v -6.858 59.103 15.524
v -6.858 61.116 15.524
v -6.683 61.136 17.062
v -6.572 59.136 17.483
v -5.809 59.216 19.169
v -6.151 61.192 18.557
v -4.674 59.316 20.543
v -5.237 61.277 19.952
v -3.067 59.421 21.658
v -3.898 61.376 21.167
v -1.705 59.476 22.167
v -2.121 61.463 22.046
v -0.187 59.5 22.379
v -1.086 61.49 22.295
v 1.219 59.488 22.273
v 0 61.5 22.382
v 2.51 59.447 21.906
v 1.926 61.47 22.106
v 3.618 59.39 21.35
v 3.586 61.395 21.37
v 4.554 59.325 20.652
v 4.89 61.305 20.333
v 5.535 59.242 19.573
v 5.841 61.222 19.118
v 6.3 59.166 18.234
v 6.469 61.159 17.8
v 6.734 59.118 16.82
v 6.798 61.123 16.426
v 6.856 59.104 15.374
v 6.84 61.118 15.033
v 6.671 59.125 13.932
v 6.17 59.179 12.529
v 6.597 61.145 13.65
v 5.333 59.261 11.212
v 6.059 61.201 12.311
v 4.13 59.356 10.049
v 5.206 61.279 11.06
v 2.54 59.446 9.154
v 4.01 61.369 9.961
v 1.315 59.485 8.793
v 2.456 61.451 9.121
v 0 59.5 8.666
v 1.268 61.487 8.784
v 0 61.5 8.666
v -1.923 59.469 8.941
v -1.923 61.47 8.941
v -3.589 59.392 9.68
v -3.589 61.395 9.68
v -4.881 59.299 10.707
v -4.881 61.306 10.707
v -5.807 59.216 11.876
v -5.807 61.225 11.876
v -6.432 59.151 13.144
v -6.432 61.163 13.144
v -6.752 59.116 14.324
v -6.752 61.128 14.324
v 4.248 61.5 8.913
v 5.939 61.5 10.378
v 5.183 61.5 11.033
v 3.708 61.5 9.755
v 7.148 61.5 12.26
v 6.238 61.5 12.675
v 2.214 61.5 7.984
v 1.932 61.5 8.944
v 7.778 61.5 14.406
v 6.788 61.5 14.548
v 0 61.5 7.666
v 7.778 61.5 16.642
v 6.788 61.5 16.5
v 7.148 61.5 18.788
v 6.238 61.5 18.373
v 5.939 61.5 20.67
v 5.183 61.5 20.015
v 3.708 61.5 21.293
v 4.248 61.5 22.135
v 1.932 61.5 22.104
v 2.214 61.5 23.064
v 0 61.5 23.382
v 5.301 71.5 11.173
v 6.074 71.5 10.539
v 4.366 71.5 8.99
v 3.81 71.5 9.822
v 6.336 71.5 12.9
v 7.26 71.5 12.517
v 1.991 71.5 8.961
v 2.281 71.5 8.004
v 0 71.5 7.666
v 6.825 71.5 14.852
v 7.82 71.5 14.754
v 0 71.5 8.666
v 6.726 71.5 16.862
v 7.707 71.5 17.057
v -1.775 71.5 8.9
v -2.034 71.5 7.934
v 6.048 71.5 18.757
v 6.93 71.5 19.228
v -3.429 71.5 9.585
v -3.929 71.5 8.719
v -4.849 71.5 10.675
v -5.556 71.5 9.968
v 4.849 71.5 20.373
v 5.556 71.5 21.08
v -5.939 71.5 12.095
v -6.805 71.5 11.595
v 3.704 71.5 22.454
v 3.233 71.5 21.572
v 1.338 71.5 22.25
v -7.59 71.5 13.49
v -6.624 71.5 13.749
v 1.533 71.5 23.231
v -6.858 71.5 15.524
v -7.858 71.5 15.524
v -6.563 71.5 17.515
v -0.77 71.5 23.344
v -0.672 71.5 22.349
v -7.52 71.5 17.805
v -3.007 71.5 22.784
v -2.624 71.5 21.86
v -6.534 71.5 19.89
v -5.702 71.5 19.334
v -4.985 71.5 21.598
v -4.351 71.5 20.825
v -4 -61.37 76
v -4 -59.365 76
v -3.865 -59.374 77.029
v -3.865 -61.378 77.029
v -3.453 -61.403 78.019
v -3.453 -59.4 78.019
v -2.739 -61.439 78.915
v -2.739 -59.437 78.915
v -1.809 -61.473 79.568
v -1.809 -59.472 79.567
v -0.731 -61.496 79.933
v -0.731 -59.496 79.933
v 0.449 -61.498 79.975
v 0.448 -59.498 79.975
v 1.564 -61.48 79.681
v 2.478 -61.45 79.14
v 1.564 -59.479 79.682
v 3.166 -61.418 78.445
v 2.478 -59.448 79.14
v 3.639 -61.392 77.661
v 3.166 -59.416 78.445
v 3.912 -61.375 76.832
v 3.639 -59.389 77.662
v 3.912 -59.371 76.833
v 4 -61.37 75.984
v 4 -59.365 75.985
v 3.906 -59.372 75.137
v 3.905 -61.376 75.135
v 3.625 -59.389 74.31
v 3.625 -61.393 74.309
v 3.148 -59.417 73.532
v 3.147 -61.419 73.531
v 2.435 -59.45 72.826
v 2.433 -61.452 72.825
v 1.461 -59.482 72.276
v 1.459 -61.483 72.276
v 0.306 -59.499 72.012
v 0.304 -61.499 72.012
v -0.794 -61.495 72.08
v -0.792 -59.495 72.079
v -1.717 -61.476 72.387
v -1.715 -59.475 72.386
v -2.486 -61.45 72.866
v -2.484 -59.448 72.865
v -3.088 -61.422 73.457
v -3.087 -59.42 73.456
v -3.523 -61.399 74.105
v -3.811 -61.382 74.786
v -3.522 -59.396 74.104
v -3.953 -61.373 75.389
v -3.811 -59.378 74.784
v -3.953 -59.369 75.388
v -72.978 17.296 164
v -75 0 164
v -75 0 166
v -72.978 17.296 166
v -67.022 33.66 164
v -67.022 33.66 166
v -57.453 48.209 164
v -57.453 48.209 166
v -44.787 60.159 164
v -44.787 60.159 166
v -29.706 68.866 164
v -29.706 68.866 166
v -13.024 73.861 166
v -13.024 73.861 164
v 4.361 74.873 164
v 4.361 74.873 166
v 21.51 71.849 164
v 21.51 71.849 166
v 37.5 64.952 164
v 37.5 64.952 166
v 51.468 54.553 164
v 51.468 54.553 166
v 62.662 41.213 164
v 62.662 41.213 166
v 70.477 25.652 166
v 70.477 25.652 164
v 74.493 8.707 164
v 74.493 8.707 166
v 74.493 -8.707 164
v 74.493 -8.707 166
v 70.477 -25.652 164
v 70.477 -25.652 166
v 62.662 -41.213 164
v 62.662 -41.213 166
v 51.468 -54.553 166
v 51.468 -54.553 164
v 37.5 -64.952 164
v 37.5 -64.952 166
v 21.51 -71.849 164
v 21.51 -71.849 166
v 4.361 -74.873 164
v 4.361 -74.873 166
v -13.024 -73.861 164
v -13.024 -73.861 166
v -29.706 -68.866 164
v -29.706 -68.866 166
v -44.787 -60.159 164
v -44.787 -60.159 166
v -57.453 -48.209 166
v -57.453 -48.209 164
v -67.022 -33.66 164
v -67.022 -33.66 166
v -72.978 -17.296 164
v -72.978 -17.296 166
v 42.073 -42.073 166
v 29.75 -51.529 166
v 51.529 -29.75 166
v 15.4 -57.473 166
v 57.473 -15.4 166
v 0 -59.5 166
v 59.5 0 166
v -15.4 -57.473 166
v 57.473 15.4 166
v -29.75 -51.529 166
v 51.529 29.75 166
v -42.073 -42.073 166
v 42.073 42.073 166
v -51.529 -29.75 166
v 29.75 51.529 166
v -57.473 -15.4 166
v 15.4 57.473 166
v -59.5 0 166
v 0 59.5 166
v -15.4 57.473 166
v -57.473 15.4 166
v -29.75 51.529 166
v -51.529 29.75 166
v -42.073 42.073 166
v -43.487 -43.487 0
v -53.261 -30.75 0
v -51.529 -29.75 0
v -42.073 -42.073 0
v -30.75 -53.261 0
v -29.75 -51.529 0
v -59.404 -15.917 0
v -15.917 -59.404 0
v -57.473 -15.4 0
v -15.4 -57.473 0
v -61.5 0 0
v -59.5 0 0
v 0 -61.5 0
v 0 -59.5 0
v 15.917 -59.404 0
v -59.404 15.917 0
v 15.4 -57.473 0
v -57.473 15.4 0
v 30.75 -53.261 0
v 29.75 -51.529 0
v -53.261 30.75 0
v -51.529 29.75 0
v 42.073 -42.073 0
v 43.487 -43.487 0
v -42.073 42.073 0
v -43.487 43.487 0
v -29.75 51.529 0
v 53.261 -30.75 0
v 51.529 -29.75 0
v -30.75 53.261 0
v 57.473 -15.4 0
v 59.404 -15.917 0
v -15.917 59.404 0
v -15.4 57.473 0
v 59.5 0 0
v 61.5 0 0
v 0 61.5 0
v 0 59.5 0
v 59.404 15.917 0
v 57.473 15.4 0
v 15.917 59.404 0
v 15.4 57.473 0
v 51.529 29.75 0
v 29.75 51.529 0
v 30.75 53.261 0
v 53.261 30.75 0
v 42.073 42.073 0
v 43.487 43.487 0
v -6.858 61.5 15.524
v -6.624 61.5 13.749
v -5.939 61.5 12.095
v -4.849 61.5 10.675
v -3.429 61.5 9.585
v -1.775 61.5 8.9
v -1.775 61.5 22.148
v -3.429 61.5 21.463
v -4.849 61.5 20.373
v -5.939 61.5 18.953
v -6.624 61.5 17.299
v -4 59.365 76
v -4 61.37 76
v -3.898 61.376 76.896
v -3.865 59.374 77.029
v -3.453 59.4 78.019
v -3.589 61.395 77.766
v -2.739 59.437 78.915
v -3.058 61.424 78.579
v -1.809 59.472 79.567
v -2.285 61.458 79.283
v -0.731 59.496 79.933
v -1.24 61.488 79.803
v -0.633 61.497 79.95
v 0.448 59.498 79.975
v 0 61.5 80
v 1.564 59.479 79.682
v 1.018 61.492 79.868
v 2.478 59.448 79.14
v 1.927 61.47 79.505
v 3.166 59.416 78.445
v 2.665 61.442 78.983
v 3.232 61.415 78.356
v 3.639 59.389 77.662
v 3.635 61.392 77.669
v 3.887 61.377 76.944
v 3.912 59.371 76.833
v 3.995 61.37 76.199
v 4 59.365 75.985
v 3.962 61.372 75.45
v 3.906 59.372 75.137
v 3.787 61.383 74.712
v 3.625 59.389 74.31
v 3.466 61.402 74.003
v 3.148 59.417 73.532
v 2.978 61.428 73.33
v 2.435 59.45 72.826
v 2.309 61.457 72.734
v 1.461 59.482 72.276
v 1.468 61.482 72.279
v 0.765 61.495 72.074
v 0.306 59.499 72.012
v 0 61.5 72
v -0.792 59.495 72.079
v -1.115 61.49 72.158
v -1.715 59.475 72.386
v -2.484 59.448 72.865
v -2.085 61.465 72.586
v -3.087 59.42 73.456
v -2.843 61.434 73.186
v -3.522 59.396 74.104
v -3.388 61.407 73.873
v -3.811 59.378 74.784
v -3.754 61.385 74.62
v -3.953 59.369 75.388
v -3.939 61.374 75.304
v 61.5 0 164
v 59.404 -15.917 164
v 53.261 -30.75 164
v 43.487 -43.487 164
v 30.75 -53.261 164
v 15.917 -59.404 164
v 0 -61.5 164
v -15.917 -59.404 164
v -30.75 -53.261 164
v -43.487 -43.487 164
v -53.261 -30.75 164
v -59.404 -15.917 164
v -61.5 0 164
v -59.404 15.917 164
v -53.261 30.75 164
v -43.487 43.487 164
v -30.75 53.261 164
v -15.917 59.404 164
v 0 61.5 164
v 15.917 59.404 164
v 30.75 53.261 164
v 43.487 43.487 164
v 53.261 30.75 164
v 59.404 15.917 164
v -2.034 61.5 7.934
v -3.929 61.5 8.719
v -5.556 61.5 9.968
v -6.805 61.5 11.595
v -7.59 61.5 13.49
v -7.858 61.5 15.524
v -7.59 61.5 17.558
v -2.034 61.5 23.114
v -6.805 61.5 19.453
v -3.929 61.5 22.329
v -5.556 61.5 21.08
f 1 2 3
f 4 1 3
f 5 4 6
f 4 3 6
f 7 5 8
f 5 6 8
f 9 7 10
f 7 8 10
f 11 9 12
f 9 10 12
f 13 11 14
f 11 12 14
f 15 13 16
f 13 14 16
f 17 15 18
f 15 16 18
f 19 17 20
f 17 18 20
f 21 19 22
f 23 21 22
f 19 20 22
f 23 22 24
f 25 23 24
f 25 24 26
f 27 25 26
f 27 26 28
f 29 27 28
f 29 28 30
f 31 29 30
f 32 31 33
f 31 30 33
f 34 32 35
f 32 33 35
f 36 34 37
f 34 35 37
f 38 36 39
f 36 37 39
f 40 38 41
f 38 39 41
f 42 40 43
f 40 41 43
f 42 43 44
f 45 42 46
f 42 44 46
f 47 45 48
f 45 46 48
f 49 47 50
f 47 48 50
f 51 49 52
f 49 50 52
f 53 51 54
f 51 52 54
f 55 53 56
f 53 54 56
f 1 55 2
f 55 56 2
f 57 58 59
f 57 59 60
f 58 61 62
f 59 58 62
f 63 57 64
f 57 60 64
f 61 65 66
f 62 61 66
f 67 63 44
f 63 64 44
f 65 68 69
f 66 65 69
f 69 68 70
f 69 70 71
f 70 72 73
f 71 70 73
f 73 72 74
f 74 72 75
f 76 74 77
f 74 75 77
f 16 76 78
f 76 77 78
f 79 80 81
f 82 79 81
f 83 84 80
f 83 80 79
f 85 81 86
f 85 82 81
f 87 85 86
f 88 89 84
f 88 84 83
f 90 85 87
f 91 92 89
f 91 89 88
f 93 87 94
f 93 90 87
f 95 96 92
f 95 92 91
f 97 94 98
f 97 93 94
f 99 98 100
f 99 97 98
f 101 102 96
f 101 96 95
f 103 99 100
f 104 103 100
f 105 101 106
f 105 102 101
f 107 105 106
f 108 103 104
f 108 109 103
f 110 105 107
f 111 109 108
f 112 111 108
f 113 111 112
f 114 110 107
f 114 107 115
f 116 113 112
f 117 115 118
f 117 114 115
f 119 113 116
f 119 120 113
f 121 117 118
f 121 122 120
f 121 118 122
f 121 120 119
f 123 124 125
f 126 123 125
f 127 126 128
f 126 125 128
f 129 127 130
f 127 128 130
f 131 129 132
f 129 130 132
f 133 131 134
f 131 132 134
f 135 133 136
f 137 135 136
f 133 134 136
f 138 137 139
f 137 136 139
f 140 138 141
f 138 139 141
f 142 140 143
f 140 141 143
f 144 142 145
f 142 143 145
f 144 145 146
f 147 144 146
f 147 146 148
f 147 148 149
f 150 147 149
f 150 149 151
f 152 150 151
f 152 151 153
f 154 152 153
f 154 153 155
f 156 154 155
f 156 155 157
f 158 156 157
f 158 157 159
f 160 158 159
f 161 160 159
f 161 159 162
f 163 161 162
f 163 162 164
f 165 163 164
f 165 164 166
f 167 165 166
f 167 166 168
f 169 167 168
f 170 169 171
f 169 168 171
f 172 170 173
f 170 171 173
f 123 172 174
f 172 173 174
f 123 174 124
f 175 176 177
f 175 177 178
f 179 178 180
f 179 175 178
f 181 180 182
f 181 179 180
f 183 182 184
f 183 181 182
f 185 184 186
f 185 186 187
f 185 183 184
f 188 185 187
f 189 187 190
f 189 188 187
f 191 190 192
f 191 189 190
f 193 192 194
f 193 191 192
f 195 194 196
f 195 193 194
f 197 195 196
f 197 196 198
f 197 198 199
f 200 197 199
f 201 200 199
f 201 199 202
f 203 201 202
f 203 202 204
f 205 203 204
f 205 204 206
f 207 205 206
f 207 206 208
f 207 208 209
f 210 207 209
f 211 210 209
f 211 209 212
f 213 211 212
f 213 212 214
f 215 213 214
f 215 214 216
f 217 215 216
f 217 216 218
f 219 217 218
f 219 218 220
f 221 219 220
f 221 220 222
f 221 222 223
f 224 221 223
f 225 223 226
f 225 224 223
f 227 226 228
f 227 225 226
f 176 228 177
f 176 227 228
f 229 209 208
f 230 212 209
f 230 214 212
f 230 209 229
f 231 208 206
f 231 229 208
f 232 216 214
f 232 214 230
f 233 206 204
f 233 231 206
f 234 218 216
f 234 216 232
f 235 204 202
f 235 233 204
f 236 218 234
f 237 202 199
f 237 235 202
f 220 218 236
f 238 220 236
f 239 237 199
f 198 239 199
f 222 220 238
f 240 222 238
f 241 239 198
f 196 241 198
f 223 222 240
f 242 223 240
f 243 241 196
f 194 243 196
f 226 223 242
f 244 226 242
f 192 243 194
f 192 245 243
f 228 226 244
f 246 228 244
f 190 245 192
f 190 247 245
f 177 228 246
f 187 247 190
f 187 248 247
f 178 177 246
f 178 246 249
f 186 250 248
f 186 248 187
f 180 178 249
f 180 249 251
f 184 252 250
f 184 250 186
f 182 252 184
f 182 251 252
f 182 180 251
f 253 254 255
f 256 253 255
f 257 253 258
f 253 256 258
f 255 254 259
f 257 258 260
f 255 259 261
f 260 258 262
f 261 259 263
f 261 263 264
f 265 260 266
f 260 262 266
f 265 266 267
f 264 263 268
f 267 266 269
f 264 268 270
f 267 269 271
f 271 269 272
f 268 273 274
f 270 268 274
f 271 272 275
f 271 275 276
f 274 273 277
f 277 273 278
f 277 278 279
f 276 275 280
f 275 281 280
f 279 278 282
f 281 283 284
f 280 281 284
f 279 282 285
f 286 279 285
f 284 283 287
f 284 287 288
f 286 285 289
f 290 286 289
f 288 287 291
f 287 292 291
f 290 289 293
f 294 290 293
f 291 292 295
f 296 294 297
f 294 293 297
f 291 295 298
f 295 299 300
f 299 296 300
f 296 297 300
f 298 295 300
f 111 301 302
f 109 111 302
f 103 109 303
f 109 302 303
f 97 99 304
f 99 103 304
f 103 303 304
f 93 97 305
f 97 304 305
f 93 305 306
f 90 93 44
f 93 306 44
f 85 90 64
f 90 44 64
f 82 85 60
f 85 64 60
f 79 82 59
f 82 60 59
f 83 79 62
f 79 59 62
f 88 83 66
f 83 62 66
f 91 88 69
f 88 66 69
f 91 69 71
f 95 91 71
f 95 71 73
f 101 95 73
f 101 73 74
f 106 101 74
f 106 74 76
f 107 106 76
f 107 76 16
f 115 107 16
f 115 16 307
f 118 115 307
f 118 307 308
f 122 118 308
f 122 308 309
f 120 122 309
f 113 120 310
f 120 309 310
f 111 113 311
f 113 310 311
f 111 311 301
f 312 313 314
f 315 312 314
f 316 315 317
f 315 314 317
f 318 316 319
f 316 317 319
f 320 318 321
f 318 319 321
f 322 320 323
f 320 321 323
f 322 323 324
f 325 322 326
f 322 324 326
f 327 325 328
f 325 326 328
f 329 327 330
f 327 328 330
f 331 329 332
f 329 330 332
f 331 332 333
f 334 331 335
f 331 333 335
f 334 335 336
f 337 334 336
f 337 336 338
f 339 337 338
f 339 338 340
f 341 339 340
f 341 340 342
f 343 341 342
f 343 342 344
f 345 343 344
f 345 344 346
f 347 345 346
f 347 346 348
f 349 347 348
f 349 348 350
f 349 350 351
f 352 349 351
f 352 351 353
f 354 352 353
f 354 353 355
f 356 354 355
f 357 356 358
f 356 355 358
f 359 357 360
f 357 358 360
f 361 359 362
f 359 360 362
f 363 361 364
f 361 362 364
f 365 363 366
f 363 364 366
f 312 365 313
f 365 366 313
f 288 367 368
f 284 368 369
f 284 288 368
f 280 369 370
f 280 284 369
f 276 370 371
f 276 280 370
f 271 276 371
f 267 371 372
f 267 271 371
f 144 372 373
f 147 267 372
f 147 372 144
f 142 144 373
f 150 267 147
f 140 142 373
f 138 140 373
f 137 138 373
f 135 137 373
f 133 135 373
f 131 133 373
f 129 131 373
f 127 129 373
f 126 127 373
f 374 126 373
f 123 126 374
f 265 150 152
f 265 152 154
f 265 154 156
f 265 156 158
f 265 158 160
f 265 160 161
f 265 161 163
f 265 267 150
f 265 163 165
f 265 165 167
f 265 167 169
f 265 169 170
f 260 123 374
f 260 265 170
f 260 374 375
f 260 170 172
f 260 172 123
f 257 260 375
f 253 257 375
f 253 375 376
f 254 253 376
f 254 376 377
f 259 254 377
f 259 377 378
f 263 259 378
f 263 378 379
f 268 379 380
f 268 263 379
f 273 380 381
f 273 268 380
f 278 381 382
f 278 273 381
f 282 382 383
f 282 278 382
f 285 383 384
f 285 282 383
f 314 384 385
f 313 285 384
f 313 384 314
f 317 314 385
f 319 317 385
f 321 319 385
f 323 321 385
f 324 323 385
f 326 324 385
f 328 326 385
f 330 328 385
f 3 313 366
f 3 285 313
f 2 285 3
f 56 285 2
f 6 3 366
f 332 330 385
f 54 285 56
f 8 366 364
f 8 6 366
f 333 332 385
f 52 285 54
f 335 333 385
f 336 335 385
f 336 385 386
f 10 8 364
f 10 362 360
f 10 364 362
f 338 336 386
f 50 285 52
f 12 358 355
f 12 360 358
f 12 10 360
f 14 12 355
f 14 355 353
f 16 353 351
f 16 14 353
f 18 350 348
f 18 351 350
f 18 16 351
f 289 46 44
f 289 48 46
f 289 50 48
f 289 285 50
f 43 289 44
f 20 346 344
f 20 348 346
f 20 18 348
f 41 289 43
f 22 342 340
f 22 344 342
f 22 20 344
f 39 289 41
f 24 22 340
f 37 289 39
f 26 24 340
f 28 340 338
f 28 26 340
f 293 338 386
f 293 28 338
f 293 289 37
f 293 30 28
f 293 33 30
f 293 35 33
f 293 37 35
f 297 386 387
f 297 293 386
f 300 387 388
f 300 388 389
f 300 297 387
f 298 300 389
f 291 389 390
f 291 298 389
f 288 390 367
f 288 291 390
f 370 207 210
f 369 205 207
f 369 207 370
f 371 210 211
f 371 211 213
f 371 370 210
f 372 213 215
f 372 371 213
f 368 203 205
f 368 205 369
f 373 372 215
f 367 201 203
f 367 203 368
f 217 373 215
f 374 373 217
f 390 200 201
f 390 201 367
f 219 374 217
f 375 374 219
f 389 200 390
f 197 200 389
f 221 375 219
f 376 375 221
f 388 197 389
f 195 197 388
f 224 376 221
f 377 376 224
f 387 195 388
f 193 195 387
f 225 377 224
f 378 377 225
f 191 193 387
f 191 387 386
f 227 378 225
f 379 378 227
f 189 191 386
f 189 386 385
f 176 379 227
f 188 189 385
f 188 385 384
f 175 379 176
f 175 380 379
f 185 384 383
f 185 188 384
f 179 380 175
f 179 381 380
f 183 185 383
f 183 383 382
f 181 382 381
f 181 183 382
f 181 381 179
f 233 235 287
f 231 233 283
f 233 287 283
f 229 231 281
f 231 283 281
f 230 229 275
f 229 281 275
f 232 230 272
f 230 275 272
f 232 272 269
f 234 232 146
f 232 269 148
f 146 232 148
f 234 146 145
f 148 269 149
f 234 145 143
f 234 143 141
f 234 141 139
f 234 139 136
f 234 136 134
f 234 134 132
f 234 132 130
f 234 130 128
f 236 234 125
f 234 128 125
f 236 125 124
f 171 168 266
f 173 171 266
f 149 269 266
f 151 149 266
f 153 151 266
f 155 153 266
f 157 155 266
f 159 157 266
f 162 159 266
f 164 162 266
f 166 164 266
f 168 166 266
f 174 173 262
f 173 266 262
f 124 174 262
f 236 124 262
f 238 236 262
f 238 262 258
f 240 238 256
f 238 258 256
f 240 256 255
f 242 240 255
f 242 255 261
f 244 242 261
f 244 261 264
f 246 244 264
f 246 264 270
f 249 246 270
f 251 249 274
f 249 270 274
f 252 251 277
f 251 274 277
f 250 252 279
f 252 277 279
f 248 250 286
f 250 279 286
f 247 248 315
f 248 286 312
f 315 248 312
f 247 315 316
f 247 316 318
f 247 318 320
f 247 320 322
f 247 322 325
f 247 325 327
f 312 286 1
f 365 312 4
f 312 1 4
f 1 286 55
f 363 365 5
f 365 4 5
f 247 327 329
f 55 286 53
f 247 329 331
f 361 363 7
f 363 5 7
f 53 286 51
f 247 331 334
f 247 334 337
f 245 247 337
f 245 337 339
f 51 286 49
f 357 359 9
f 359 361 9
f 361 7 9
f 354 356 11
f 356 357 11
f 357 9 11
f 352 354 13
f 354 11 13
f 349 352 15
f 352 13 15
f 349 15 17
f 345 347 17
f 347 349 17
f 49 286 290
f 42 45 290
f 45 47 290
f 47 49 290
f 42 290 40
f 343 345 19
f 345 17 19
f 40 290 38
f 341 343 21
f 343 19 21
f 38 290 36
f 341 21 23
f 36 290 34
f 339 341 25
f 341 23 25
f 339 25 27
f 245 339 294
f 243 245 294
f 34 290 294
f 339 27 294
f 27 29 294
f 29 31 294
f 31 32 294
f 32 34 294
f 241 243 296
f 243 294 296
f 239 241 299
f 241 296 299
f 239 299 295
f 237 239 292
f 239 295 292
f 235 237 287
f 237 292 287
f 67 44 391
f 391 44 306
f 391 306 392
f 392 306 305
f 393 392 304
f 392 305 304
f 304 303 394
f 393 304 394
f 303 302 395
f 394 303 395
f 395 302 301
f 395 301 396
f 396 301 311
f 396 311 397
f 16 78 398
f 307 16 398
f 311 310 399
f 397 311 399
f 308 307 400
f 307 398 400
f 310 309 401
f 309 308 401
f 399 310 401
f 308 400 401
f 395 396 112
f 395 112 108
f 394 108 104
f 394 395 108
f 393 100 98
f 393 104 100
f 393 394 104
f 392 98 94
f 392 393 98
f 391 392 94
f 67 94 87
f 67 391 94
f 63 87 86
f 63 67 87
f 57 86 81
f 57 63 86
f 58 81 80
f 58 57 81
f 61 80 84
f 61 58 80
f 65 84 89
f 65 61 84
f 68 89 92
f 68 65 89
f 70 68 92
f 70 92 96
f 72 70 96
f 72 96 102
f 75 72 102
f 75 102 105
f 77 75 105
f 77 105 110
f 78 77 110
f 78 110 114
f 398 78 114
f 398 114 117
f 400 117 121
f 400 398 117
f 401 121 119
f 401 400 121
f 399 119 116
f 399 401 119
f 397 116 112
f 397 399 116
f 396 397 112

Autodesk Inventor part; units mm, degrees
ref_plane "YZ Plane" through (0, 0, 0) normal (1, 0, 0) x (0, 1, 0)
ref_plane "XY Plane" through (0, 0, 0) normal (0, 0, 1) x (1, 0, 0)
sketch "Sketch1" plane through (0, 0, 0) normal (0, 0, 1) x (1, 0, 0)
  circle A0 centre (0, 0) radius 59.5
  circle A1 centre (0, 0) radius 61.5
  dimension "d0" = 119
  dimension "d1" = 123
extrude "Extrusion1" add sketch "Sketch1" along normal blind 331
ref_plane "Work Plane1" through (0, 61.5, 0) normal (0, 1, 0) x (-1, 0, 0)
sketch "Sketch2" plane through (0, 61.5, 0) normal (0, 1, 0) x (-1, 0, 0)
  line L0 (61.5, 0) -> (-61.5, 0) projected
  line L1 (0, 0) -> (0, 4)
  line L2 (0, 4) -> (0, 8.666)
  circle A0 centre (0, 15.524) radius 6.858
  circle A1 centre (0, 15.524) radius 7.858
  dimension "d6" = 4
  dimension "d7" = 4.666
  dimension "d8" = 13.716
  dimension "d9" = 6.858
  dimension "d33" = 15.716
extrude "Extrusion2" cut sketch "Sketch2" against normal blind 23 contours A0
sketch "Sketch3" plane through (0, 61.5, 0) normal (0, 1, 0) x (-1, 0, 0)
  line L0 (0, 0) -> (0, 331) construction
  line L1 (-59.5, 331) -> (59.5, 331) projected
  line L2 (0, 331) -> (0, 323) construction
  circle A0 centre (0, 320.142) radius 6.858
  circle A1 centre (0, 320.142) radius 7.858
  point P0 (0, 327)
  dimension "d12" = 8
  dimension "d13" = 13.716
  dimension "d14" = 6.858
  dimension "d36" = 15.716
extrude "Extrusion3" cut sketch "Sketch3" against normal blind 3 contours A0
thread "Thread1" size "M14x1.25" class "6H" standard "ANSI Metric M Profile" full length
thread "Thread2" size "M14x1.25" class "6H" standard "ANSI Metric M Profile" full length
sketch "Sketch4" plane through (0, 61.5, 0) normal (0, 1, 0) x (-1, 0, 0)
  point P0 (0, 0)
sketch "Sketch5" plane through (0, 61.5, 0) normal (0, 1, 0) x (-1, 0, 0)
  line L0 (0, 0) -> (0, 76) construction
  circle A0 centre (0, 76) radius 4
  dimension "d21" = 76
  dimension "d22" = 8
extrude "Extrusion4" cut sketch "Sketch5" against normal through all
thread "Thread3" size "M8x1.25" class "6H" standard "ANSI Metric M Profile" full length
thread "Thread4" size "M8x1.25" class "6H" standard "ANSI Metric M Profile" full length
sketch "Sketch6" plane through (0, 0, 331) normal (0, 0, 1) x (1, 0, 0)
  circle A0 centre (0, 0) radius 75
  circle A1 centre (0, 0) radius 61.5
  dimension "d29" = 150
  dimension "d30" = 123
extrude "Extrusion5" add sketch "Sketch6" against normal blind 2
extrude "Extrusion6" add sketch "Sketch2" along normal blind 10
extrude "Extrusion7" add sketch "Sketch3" along normal blind 10
ref_plane "Work Plane2" through (0, 0, 166) normal (0, 0, -1) x (-1, 0, 0)
sketch "Sketch7" plane through (0, 0, 166) normal (0, 0, -1) x (-1, 0, 0)
  circle A0 centre (0, 0) radius 75
  circle A1 centre (0, 0) radius 59.5 projected
  circle A2 centre (0, 0) radius 59.5
  dimension "d40" = 150
extrude "Extrusion8" add sketch "Sketch7" along normal blind 2
extrude "Extrusion9" add sketch "Sketch7" against normal blind 2
split "Split4" plane through (0, 0, 166) removes the side toward (0, 0, 1)
properties part number "stainless steel outer wall back" material "Aluminum 6061"
